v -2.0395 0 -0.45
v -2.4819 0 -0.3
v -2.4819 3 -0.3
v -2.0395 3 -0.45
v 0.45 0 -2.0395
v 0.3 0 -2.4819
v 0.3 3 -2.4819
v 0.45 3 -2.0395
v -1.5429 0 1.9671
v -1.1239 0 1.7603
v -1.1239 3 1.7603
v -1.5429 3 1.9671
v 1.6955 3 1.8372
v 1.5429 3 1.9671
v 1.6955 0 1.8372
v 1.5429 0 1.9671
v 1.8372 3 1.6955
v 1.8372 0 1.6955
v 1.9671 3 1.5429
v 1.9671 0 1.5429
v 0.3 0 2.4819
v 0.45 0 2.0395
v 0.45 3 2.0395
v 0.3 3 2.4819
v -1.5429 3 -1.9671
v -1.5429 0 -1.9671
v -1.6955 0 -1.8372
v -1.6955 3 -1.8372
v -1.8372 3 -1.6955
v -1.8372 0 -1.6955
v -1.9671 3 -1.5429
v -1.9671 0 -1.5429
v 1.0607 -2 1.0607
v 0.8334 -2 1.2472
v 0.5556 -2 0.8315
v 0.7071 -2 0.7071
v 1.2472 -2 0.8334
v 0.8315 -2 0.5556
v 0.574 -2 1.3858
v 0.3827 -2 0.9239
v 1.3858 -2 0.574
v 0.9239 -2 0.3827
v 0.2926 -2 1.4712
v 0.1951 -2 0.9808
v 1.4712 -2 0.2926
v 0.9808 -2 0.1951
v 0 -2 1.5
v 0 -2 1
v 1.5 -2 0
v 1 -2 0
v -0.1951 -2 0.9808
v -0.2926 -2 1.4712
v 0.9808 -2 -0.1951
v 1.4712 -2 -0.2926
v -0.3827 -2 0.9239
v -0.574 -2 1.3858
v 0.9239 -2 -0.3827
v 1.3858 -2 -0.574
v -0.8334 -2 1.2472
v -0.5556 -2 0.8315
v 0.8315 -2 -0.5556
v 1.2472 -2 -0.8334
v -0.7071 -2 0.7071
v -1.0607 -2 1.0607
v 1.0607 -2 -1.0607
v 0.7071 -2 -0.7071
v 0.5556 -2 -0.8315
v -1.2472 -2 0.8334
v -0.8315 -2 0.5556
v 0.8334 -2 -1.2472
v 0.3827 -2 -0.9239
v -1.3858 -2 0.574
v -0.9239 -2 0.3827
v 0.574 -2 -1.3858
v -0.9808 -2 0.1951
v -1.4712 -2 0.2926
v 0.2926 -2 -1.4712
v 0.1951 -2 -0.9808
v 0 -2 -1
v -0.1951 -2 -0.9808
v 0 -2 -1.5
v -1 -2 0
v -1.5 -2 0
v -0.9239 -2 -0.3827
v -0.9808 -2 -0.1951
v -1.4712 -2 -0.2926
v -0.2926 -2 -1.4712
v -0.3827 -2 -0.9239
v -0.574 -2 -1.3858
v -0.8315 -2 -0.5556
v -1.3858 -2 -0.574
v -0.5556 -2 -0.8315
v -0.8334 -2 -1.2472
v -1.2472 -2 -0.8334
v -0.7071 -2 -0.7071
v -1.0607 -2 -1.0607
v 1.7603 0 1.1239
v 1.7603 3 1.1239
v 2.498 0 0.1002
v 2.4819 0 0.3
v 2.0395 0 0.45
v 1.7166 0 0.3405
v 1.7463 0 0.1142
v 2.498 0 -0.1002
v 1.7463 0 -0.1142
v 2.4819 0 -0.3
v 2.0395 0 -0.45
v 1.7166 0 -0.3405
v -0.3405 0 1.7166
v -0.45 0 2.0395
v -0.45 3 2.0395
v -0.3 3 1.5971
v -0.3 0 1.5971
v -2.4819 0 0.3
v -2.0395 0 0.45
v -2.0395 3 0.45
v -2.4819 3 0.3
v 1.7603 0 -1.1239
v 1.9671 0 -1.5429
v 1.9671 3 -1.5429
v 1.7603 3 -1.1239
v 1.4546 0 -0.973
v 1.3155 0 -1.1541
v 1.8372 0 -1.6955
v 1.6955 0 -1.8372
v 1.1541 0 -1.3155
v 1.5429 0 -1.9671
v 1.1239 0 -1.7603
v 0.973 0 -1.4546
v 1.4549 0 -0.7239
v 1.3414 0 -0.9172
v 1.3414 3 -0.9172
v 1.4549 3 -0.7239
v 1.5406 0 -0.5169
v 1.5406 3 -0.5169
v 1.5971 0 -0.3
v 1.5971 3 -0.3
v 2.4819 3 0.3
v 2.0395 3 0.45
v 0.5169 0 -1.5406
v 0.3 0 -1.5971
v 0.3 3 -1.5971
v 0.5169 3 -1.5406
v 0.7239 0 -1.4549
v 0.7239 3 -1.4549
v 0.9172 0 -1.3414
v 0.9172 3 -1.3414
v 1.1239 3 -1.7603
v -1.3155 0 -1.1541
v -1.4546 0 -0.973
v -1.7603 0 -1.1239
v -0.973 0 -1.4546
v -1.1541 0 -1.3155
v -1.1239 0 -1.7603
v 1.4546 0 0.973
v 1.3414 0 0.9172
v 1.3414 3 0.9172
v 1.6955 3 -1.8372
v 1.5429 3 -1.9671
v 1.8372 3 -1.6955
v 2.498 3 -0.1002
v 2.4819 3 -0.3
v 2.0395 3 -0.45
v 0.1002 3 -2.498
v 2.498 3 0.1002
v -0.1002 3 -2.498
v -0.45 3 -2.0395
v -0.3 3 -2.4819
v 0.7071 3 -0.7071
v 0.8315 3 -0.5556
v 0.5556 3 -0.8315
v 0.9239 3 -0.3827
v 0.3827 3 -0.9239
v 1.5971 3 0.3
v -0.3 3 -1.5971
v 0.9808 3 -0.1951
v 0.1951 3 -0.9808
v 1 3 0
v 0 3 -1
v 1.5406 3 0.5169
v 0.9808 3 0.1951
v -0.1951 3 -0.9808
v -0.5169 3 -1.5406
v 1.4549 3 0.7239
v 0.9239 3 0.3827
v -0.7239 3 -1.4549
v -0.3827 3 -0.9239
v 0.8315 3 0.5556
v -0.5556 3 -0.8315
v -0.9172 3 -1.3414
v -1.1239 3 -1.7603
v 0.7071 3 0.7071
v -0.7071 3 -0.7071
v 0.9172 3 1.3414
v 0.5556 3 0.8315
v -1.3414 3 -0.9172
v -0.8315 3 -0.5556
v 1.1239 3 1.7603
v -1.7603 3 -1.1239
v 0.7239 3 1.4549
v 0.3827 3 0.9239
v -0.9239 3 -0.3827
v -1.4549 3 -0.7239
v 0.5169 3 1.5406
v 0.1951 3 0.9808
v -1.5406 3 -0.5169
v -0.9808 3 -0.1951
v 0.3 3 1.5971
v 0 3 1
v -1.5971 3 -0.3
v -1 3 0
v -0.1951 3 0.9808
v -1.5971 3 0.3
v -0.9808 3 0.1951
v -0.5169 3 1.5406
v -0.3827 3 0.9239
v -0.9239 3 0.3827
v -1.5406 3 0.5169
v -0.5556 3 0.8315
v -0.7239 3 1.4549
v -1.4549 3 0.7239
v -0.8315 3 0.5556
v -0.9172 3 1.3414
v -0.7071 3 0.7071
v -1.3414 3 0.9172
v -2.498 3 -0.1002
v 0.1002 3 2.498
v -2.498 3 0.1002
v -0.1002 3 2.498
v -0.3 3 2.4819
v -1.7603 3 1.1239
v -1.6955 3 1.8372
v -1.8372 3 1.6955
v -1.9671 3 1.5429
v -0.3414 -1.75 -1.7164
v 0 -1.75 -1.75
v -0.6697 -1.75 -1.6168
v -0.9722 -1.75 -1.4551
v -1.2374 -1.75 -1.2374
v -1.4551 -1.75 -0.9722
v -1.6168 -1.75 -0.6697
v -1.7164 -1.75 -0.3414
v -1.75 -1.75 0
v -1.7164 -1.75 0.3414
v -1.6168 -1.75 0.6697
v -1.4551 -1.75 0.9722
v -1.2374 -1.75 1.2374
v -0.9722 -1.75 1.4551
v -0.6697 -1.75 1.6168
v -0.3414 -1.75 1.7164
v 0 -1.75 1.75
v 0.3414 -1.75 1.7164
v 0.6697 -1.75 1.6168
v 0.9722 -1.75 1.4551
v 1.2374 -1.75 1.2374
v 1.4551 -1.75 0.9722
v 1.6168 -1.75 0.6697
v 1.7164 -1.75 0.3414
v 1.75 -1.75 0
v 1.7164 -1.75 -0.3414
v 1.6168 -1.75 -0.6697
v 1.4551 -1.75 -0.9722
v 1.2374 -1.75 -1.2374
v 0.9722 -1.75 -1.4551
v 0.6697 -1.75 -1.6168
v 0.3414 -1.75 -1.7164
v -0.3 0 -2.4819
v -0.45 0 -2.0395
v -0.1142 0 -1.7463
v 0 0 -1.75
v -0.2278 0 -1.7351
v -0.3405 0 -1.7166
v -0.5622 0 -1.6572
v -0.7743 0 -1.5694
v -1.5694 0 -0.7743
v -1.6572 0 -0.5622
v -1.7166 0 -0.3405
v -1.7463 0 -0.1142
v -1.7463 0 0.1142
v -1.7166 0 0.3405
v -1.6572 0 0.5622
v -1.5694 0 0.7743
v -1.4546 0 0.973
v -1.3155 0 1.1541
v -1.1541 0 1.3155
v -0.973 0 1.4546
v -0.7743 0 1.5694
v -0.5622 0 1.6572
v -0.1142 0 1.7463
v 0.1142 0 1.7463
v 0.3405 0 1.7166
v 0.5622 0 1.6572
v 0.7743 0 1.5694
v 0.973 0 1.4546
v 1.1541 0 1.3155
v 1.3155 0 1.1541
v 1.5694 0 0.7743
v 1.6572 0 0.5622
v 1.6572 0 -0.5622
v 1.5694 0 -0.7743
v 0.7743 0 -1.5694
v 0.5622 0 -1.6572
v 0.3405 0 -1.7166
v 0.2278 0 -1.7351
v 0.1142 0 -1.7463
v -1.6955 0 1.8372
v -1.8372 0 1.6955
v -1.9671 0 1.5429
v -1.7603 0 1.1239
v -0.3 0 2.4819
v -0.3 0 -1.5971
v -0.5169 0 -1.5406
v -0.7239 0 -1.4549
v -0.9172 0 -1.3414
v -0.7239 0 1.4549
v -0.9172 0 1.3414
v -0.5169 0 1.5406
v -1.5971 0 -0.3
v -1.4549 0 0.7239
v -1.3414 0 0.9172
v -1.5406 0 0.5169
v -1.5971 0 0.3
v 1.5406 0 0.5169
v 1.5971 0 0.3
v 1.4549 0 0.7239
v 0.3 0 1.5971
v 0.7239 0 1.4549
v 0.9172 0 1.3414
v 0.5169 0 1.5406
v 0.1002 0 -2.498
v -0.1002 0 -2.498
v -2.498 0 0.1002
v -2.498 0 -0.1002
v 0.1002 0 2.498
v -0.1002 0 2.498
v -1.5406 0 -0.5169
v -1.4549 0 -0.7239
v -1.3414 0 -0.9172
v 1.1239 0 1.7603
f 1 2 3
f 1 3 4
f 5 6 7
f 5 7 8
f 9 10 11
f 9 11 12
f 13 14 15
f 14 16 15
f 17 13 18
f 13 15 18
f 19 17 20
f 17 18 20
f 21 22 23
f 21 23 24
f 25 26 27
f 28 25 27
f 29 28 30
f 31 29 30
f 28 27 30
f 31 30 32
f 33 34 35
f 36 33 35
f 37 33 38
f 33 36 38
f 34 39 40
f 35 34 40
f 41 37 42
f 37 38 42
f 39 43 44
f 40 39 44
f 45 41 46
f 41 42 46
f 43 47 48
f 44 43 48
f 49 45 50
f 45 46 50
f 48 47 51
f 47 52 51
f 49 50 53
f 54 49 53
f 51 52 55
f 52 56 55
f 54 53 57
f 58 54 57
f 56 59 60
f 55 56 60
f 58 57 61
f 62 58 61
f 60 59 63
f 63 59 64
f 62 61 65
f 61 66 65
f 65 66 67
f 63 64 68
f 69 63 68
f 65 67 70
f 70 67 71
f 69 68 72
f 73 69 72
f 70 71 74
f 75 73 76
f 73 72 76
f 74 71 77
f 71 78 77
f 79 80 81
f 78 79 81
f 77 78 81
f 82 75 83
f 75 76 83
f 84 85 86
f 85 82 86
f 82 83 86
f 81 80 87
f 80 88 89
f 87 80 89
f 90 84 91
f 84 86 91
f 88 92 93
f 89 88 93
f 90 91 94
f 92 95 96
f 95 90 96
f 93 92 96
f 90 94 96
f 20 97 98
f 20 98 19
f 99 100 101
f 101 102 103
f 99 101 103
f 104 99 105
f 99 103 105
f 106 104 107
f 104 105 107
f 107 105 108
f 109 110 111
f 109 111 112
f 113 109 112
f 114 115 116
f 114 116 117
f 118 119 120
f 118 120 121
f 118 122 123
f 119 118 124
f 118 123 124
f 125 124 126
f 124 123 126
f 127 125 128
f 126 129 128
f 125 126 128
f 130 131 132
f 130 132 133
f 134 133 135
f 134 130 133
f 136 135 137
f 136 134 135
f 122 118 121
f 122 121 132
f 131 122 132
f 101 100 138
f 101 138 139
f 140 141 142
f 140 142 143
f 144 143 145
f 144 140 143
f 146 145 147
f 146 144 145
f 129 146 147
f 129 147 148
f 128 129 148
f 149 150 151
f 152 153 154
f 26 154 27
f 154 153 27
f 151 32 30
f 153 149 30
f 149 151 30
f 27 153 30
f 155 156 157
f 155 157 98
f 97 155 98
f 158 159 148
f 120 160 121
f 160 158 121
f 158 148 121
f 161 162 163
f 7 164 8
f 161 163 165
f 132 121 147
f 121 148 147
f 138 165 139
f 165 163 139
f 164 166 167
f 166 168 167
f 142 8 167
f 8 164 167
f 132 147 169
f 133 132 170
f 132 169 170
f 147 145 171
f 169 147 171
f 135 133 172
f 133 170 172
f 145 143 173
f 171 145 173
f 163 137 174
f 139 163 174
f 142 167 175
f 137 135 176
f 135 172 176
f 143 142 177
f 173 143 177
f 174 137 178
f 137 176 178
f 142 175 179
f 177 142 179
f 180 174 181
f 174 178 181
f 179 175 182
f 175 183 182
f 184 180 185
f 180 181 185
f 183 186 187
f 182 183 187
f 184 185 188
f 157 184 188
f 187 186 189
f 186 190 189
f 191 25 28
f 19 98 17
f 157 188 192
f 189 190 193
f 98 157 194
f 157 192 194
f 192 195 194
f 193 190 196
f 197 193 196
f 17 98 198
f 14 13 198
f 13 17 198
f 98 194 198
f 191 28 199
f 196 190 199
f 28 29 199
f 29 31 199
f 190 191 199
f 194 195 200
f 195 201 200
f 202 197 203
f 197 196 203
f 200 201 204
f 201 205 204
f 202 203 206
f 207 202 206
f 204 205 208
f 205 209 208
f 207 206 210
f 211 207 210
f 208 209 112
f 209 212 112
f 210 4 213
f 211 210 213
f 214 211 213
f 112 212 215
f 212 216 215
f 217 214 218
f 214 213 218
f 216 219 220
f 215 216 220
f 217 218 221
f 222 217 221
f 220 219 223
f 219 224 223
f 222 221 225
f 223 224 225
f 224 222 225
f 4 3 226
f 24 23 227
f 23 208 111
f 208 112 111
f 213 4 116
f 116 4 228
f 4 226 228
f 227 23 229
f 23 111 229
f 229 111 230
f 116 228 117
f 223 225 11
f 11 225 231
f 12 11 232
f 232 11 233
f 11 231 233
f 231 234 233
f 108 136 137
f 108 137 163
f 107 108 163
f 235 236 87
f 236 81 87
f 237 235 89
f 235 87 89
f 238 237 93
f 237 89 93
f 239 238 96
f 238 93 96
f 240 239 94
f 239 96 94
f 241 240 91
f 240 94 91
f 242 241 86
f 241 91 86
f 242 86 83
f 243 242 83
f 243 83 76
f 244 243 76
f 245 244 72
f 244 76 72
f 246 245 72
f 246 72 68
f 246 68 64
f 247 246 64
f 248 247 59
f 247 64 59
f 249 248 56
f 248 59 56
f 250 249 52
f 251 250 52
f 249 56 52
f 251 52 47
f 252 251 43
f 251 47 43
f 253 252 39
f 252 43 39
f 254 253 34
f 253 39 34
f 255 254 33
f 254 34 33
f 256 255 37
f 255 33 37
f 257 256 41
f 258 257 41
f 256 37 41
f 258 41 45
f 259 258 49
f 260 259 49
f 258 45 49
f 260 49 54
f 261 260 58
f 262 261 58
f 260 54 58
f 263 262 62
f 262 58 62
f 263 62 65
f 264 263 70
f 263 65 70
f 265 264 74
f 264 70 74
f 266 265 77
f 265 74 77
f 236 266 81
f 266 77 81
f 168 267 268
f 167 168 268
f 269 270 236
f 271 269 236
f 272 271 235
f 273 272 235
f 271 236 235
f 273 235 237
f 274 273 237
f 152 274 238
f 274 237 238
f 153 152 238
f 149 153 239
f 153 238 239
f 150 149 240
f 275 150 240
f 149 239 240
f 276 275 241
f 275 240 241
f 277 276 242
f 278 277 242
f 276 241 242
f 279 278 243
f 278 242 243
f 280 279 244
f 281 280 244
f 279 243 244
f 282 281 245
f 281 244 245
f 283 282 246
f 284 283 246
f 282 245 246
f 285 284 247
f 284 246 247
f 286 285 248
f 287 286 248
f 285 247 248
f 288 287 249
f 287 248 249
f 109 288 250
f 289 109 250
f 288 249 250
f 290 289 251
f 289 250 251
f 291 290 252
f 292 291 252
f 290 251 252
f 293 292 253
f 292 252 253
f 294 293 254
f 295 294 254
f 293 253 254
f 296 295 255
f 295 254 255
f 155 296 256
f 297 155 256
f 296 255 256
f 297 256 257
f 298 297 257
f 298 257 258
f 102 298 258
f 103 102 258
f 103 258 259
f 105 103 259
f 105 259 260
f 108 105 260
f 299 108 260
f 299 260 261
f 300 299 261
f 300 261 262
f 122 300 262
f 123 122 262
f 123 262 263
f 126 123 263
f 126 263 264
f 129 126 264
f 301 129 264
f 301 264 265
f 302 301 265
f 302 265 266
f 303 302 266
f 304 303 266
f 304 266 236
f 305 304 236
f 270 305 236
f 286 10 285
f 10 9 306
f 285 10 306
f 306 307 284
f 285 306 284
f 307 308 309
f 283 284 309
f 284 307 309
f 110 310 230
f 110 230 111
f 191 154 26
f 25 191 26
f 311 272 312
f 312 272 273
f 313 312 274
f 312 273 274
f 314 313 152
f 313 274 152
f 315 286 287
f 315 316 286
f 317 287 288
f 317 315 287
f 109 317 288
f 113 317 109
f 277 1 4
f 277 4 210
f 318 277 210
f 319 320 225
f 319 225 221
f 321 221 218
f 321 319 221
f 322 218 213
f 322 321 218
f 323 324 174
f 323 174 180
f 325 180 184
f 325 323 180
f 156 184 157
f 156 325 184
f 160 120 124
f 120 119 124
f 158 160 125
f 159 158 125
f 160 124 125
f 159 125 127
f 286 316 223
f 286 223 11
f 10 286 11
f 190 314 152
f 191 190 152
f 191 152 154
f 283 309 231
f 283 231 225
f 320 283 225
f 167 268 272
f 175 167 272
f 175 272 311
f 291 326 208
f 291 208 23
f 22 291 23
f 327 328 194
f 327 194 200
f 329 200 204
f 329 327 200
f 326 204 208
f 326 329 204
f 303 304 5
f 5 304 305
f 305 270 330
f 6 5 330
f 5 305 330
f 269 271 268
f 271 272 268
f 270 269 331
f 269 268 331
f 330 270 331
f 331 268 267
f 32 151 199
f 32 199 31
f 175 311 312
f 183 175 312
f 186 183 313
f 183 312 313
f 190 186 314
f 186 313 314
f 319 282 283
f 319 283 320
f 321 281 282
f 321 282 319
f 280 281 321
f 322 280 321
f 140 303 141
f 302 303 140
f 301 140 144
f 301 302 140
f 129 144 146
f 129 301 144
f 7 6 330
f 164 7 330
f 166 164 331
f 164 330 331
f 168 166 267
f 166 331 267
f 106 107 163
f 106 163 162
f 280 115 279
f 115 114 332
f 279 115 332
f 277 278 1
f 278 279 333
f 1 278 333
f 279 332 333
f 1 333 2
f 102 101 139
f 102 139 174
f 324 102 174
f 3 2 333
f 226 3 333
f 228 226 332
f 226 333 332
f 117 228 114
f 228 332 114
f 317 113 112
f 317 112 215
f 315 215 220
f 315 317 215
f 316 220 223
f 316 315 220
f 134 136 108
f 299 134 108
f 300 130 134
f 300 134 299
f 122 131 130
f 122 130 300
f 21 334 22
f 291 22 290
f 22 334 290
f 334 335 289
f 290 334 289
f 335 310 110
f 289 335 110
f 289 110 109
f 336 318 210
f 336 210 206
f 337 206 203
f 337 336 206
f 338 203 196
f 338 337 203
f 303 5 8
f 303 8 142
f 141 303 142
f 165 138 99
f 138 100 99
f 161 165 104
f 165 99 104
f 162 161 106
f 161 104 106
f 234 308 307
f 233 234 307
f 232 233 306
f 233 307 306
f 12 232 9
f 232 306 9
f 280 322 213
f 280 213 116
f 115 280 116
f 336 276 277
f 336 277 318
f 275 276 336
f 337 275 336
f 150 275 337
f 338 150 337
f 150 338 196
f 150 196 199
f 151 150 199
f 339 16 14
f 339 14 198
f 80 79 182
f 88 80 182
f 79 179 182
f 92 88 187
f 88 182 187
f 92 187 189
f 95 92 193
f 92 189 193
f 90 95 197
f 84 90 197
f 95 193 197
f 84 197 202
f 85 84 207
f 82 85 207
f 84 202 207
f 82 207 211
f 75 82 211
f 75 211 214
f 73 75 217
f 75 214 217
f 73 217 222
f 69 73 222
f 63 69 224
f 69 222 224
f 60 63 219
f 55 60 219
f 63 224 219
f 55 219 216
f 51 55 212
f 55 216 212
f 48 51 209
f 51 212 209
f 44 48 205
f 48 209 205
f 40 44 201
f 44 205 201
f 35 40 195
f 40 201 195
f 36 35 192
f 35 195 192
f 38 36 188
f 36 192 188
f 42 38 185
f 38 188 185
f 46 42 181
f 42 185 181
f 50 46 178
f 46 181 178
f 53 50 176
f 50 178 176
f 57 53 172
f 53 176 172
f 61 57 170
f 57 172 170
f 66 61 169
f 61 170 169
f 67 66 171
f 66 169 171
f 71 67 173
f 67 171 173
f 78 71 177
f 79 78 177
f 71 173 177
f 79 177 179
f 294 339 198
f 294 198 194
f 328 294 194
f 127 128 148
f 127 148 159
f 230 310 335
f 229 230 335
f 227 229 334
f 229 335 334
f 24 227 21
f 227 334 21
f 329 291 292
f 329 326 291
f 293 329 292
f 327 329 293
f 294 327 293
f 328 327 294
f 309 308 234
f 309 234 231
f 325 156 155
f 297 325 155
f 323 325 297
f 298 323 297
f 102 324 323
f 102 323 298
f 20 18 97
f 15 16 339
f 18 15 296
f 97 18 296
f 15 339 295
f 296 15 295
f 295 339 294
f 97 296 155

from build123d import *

# Parameters (mm, degrees)
CUT_EXTRUDE1_START = -3
CUT_EXTRUDE1_DEPTH = 3


with BuildPart() as part:
    # Sketch1 → Revolve1 (revolve)
    with BuildSketch(Plane.XY, mode=Mode.PRIVATE) as revolve1_sk:
        Polygon((1, 3), (2.5, 3), (2.5, 0), (1.75, 0), (1.75, -1.75), (1.5, -2), (1, -2), align=None)
    revolve(revolve1_sk.sketch.rotate(Axis((0, -2, 0), (0, 1, 0)), 90), axis=Axis((0, -2, 0), (0, 1, 0)))

    # Sketch2 → Cut-Extrude1 (cut)
    with BuildSketch(Plane(origin=(0, 3, 0), x_dir=(1, 0, 0), z_dir=(0, 1, 0)).offset(CUT_EXTRUDE1_START)):
        with BuildLine():
            Line((-0.3, 2.481934729), (-0.45, 2.039501177))
            Line((-0.45, 2.039501177), (-0.3, 1.597067625))
            ThreePointArc((-0.3, 1.597067625), (-0.621860578, 1.50130424), (-0.917165314, 1.341429382))
            Line((-0.917165314, 1.341429382), (-1.123947061, 1.760343164))
            Line((-1.123947061, 1.760343164), (-1.542860843, 1.967124912))
            ThreePointArc((-1.542860843, 1.967124912), (-0.956708581, 2.309698831), (-0.3, 2.481934729))
        make_face()
        with BuildLine():
            Line((0.45, 2.039501177), (0.3, 1.597067625))
            ThreePointArc((0.3, 1.597067625), (0.621860578, 1.50130424), (0.917165314, 1.341429382))
            Line((0.917165314, 1.341429382), (1.123947061, 1.760343164))
            Line((1.123947061, 1.760343164), (1.542860843, 1.967124912))
            ThreePointArc((1.542860843, 1.967124912), (0.956708581, 2.309698831), (0.3, 2.481934729))
            Line((0.3, 2.481934729), (0.45, 2.039501177))
        make_face()
        with BuildLine():
            Line((1.760343164, 1.123947061), (1.341429382, 0.917165314))
            ThreePointArc((1.341429382, 0.917165314), (1.50130424, 0.621860578), (1.597067625, 0.3))
            Line((1.597067625, 0.3), (2.039501177, 0.45))
            Line((2.039501177, 0.45), (2.481934729, 0.3))
            ThreePointArc((2.481934729, 0.3), (2.309698831, 0.956708581), (1.967124912, 1.542860843))
            Line((1.967124912, 1.542860843), (1.760343164, 1.123947061))
        make_face()
        with BuildLine():
            Line((2.039501177, -0.45), (1.597067625, -0.3))
            ThreePointArc((1.597067625, -0.3), (1.50130424, -0.621860578), (1.341429382, -0.917165314))
            Line((1.341429382, -0.917165314), (1.760343164, -1.123947061))
            Line((1.760343164, -1.123947061), (1.967124912, -1.542860843))
            ThreePointArc((1.967124912, -1.542860843), (2.309698831, -0.956708581), (2.481934729, -0.3))
            Line((2.481934729, -0.3), (2.039501177, -0.45))
        make_face()
        with BuildLine():
            Line((1.123947061, -1.760343164), (0.917165314, -1.341429382))
            ThreePointArc((0.917165314, -1.341429382), (0.621860578, -1.50130424), (0.3, -1.597067625))
            Line((0.3, -1.597067625), (0.45, -2.039501177))
            Line((0.45, -2.039501177), (0.3, -2.481934729))
            ThreePointArc((0.3, -2.481934729), (0.956708581, -2.309698831), (1.542860843, -1.967124912))
            Line((1.542860843, -1.967124912), (1.123947061, -1.760343164))
        make_face()
        with BuildLine():
            Line((-0.45, -2.039501177), (-0.3, -1.597067625))
            ThreePointArc((-0.3, -1.597067625), (-0.621860578, -1.50130424), (-0.917165314, -1.341429382))
            Line((-0.917165314, -1.341429382), (-1.123947061, -1.760343164))
            Line((-1.123947061, -1.760343164), (-1.542860843, -1.967124912))
            ThreePointArc((-1.542860843, -1.967124912), (-0.956708581, -2.309698831), (-0.3, -2.481934729))
            Line((-0.3, -2.481934729), (-0.45, -2.039501177))
        make_face()
        with BuildLine():
            Line((-1.760343164, -1.123947061), (-1.341429382, -0.917165314))
            ThreePointArc((-1.341429382, -0.917165314), (-1.50130424, -0.621860578), (-1.597067625, -0.3))
            Line((-1.597067625, -0.3), (-2.039501177, -0.45))
            Line((-2.039501177, -0.45), (-2.481934729, -0.3))
            ThreePointArc((-2.481934729, -0.3), (-2.309698831, -0.956708581), (-1.967124912, -1.542860843))
            Line((-1.967124912, -1.542860843), (-1.760343164, -1.123947061))
        make_face()
        with BuildLine():
            Line((-2.039501177, 0.45), (-1.597067625, 0.3))
            ThreePointArc((-1.597067625, 0.3), (-1.50130424, 0.621860578), (-1.341429382, 0.917165314))
            Line((-1.341429382, 0.917165314), (-1.760343164, 1.123947061))
            Line((-1.760343164, 1.123947061), (-1.967124912, 1.542860843))
            ThreePointArc((-1.967124912, 1.542860843), (-2.309698831, 0.956708581), (-2.481934729, 0.3))
            Line((-2.481934729, 0.3), (-2.039501177, 0.45))
        make_face()
    extrude(amount=CUT_EXTRUDE1_DEPTH, mode=Mode.SUBTRACT)


solid = part.part
